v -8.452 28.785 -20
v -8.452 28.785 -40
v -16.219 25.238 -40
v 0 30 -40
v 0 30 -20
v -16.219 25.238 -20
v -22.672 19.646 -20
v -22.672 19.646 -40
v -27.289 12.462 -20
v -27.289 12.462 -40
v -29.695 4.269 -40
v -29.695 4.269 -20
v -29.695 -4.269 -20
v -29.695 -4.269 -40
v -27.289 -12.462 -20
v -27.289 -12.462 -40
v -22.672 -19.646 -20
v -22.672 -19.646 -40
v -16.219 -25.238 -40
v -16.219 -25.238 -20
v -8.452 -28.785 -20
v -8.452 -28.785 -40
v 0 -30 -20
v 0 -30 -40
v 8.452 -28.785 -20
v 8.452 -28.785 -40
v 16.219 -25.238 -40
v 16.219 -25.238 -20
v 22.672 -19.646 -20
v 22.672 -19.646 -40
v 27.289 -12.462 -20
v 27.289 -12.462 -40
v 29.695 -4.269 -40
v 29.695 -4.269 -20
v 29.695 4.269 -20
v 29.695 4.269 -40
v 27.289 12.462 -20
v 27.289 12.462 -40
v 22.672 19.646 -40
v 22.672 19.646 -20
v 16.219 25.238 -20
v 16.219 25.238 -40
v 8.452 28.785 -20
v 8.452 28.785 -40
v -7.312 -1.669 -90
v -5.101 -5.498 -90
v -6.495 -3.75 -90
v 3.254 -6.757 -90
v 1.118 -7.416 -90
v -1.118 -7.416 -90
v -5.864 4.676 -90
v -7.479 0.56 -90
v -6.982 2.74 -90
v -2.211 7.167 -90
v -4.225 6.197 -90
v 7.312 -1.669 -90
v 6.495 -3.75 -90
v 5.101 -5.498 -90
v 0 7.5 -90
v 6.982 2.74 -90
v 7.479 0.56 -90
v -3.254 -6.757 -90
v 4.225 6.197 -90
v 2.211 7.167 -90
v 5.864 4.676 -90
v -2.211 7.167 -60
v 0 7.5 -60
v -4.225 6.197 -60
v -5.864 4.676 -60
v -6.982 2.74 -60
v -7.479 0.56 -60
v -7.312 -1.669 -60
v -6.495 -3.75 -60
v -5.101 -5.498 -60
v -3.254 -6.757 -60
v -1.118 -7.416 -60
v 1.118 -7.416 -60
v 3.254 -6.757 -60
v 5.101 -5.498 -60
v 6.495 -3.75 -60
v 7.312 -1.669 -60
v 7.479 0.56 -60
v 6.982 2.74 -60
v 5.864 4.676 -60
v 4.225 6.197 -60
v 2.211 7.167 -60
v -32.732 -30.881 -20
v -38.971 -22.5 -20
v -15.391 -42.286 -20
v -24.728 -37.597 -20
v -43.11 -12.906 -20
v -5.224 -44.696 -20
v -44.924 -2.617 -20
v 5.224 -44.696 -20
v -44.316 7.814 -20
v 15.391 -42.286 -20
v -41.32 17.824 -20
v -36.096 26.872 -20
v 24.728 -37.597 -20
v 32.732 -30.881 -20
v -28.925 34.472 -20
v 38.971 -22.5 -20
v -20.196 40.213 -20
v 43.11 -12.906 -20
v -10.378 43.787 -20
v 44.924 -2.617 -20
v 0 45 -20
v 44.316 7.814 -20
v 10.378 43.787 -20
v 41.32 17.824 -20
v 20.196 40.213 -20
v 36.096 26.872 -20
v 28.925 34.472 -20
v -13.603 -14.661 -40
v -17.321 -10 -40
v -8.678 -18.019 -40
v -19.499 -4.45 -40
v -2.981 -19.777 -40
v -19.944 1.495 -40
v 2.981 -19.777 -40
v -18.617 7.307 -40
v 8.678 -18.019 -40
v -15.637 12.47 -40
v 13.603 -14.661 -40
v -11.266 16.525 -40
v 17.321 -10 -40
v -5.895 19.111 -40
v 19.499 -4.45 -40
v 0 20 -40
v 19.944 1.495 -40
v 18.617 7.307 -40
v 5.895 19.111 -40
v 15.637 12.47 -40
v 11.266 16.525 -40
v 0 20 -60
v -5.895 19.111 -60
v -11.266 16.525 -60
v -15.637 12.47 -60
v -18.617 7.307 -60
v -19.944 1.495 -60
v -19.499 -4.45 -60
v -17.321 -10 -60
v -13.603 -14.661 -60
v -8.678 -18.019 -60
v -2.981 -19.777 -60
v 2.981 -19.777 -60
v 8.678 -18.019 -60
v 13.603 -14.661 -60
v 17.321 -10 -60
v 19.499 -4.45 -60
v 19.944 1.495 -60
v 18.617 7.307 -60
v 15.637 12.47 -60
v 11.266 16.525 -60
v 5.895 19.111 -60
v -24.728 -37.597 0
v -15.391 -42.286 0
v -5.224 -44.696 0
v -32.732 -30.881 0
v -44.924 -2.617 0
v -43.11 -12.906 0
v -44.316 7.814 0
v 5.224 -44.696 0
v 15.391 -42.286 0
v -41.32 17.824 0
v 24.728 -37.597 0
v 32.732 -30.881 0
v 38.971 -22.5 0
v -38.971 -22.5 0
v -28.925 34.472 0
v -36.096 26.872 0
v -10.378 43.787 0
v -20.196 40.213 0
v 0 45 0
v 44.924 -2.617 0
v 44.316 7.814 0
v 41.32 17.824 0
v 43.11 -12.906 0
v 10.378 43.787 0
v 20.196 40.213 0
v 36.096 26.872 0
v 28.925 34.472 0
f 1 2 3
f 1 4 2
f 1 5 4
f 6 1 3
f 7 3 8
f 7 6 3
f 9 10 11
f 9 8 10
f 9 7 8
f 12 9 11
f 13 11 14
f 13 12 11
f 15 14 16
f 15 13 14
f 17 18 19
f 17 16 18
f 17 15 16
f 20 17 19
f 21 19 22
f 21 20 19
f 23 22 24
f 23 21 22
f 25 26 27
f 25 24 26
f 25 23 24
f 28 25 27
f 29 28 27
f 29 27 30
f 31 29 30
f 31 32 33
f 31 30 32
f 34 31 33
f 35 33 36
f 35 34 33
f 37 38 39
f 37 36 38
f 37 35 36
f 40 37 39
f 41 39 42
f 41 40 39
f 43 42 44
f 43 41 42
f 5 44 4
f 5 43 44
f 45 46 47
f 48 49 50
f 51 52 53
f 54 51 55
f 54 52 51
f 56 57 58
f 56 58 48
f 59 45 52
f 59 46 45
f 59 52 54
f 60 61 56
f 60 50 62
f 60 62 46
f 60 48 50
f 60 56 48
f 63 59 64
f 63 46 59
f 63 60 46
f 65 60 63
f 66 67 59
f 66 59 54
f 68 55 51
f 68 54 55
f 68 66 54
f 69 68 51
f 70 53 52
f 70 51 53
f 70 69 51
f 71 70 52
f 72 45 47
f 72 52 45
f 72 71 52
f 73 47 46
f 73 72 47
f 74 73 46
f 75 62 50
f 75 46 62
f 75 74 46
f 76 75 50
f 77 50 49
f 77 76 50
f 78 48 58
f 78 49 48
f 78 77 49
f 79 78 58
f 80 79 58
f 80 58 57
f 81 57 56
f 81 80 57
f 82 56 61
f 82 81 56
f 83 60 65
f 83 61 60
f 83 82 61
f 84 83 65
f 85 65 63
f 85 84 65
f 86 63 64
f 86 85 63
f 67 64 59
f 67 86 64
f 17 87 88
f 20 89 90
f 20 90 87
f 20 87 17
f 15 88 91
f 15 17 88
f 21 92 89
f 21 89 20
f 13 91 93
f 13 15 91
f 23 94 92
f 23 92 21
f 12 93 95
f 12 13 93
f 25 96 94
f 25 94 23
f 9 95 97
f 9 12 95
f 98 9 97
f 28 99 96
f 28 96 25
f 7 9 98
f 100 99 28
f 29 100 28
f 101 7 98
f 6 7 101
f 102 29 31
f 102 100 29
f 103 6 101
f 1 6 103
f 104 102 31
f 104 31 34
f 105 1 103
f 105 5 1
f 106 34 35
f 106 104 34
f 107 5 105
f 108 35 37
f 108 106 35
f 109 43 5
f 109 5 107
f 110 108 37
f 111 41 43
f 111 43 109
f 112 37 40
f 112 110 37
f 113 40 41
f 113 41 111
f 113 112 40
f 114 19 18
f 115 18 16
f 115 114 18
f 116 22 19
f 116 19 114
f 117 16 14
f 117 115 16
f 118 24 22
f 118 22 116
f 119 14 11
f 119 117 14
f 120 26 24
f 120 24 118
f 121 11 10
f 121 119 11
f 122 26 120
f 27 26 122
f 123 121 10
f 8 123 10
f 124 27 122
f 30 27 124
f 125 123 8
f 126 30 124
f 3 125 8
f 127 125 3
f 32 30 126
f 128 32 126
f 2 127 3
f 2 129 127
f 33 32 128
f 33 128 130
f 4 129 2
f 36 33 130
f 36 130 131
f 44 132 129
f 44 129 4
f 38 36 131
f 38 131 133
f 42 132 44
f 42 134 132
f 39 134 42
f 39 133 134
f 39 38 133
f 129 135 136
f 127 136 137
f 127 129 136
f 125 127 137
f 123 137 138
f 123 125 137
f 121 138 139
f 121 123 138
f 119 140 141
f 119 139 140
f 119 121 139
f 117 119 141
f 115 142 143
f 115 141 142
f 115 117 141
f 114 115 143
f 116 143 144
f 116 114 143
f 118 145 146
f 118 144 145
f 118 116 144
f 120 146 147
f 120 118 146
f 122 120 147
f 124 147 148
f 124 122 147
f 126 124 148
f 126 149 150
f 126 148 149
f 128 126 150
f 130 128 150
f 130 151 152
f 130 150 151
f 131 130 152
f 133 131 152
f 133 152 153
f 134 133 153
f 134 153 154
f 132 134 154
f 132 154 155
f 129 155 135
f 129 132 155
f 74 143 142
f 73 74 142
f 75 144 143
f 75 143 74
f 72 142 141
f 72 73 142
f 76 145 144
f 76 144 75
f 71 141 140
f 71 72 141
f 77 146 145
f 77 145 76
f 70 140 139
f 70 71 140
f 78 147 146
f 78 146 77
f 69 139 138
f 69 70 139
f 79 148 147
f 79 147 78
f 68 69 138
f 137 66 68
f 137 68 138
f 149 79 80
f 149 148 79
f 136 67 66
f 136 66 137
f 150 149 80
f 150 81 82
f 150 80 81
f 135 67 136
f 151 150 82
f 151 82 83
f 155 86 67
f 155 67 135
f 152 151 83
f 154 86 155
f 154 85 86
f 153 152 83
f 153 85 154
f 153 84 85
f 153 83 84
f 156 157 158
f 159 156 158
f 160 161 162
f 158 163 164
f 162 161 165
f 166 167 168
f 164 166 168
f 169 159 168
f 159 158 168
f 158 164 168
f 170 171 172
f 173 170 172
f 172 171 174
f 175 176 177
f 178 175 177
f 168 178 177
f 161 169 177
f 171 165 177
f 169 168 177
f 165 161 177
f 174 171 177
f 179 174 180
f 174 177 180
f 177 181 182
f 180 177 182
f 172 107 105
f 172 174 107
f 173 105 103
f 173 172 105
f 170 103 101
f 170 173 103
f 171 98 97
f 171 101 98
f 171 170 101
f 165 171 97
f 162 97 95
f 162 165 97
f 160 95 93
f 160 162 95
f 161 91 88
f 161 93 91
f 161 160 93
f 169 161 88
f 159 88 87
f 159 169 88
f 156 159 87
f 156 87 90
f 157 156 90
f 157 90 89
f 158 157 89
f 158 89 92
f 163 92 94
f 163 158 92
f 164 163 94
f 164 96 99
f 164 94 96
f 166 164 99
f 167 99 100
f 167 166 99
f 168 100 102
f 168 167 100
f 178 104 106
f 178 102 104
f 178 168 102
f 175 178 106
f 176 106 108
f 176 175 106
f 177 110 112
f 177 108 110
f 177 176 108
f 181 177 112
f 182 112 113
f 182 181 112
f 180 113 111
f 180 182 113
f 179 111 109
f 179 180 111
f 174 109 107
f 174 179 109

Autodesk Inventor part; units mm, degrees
ref_plane "YZ Plane" through (0, 0, 0) normal (1, 0, 0) x (0, 1, 0)
ref_plane "XZ Plane" through (0, 0, 0) normal (0, 1, 0) x (-1, 0, 0)
ref_plane "XY Plane" through (0, 0, 0) normal (0, 0, 1) x (1, 0, 0)
sketch "Sketch1" plane through (0, 0, 0) normal (1, 0, 0) x (0, 1, 0)
  line L0 (0, 0) -> (0, -90)
  line L1 (0, -90) -> (7.5, -90)
  line L2 (7.5, -90) -> (7.5, -60)
  line L3 (7.5, -60) -> (20, -60)
  line L4 (20, -60) -> (20, -40)
  line L5 (20, -40) -> (30, -40)
  line L6 (30, -40) -> (30, -20)
  line L7 (30, -20) -> (45, -20)
  line L8 (45, -20) -> (45, 0)
  line L9 (45, 0) -> (0, 0)
  dimension "d0" = 90
  dimension "d1" = 15
  dimension "d2" = 40
  dimension "d3" = 60
  dimension "d4" = 90
  dimension "d5" = 20
  dimension "d6" = 20
  dimension "d7" = 20
revolve "Revolution1" add sketch "Sketch1" angle 360 about axis through (0, 0, 0) along (0, 0, -1)
